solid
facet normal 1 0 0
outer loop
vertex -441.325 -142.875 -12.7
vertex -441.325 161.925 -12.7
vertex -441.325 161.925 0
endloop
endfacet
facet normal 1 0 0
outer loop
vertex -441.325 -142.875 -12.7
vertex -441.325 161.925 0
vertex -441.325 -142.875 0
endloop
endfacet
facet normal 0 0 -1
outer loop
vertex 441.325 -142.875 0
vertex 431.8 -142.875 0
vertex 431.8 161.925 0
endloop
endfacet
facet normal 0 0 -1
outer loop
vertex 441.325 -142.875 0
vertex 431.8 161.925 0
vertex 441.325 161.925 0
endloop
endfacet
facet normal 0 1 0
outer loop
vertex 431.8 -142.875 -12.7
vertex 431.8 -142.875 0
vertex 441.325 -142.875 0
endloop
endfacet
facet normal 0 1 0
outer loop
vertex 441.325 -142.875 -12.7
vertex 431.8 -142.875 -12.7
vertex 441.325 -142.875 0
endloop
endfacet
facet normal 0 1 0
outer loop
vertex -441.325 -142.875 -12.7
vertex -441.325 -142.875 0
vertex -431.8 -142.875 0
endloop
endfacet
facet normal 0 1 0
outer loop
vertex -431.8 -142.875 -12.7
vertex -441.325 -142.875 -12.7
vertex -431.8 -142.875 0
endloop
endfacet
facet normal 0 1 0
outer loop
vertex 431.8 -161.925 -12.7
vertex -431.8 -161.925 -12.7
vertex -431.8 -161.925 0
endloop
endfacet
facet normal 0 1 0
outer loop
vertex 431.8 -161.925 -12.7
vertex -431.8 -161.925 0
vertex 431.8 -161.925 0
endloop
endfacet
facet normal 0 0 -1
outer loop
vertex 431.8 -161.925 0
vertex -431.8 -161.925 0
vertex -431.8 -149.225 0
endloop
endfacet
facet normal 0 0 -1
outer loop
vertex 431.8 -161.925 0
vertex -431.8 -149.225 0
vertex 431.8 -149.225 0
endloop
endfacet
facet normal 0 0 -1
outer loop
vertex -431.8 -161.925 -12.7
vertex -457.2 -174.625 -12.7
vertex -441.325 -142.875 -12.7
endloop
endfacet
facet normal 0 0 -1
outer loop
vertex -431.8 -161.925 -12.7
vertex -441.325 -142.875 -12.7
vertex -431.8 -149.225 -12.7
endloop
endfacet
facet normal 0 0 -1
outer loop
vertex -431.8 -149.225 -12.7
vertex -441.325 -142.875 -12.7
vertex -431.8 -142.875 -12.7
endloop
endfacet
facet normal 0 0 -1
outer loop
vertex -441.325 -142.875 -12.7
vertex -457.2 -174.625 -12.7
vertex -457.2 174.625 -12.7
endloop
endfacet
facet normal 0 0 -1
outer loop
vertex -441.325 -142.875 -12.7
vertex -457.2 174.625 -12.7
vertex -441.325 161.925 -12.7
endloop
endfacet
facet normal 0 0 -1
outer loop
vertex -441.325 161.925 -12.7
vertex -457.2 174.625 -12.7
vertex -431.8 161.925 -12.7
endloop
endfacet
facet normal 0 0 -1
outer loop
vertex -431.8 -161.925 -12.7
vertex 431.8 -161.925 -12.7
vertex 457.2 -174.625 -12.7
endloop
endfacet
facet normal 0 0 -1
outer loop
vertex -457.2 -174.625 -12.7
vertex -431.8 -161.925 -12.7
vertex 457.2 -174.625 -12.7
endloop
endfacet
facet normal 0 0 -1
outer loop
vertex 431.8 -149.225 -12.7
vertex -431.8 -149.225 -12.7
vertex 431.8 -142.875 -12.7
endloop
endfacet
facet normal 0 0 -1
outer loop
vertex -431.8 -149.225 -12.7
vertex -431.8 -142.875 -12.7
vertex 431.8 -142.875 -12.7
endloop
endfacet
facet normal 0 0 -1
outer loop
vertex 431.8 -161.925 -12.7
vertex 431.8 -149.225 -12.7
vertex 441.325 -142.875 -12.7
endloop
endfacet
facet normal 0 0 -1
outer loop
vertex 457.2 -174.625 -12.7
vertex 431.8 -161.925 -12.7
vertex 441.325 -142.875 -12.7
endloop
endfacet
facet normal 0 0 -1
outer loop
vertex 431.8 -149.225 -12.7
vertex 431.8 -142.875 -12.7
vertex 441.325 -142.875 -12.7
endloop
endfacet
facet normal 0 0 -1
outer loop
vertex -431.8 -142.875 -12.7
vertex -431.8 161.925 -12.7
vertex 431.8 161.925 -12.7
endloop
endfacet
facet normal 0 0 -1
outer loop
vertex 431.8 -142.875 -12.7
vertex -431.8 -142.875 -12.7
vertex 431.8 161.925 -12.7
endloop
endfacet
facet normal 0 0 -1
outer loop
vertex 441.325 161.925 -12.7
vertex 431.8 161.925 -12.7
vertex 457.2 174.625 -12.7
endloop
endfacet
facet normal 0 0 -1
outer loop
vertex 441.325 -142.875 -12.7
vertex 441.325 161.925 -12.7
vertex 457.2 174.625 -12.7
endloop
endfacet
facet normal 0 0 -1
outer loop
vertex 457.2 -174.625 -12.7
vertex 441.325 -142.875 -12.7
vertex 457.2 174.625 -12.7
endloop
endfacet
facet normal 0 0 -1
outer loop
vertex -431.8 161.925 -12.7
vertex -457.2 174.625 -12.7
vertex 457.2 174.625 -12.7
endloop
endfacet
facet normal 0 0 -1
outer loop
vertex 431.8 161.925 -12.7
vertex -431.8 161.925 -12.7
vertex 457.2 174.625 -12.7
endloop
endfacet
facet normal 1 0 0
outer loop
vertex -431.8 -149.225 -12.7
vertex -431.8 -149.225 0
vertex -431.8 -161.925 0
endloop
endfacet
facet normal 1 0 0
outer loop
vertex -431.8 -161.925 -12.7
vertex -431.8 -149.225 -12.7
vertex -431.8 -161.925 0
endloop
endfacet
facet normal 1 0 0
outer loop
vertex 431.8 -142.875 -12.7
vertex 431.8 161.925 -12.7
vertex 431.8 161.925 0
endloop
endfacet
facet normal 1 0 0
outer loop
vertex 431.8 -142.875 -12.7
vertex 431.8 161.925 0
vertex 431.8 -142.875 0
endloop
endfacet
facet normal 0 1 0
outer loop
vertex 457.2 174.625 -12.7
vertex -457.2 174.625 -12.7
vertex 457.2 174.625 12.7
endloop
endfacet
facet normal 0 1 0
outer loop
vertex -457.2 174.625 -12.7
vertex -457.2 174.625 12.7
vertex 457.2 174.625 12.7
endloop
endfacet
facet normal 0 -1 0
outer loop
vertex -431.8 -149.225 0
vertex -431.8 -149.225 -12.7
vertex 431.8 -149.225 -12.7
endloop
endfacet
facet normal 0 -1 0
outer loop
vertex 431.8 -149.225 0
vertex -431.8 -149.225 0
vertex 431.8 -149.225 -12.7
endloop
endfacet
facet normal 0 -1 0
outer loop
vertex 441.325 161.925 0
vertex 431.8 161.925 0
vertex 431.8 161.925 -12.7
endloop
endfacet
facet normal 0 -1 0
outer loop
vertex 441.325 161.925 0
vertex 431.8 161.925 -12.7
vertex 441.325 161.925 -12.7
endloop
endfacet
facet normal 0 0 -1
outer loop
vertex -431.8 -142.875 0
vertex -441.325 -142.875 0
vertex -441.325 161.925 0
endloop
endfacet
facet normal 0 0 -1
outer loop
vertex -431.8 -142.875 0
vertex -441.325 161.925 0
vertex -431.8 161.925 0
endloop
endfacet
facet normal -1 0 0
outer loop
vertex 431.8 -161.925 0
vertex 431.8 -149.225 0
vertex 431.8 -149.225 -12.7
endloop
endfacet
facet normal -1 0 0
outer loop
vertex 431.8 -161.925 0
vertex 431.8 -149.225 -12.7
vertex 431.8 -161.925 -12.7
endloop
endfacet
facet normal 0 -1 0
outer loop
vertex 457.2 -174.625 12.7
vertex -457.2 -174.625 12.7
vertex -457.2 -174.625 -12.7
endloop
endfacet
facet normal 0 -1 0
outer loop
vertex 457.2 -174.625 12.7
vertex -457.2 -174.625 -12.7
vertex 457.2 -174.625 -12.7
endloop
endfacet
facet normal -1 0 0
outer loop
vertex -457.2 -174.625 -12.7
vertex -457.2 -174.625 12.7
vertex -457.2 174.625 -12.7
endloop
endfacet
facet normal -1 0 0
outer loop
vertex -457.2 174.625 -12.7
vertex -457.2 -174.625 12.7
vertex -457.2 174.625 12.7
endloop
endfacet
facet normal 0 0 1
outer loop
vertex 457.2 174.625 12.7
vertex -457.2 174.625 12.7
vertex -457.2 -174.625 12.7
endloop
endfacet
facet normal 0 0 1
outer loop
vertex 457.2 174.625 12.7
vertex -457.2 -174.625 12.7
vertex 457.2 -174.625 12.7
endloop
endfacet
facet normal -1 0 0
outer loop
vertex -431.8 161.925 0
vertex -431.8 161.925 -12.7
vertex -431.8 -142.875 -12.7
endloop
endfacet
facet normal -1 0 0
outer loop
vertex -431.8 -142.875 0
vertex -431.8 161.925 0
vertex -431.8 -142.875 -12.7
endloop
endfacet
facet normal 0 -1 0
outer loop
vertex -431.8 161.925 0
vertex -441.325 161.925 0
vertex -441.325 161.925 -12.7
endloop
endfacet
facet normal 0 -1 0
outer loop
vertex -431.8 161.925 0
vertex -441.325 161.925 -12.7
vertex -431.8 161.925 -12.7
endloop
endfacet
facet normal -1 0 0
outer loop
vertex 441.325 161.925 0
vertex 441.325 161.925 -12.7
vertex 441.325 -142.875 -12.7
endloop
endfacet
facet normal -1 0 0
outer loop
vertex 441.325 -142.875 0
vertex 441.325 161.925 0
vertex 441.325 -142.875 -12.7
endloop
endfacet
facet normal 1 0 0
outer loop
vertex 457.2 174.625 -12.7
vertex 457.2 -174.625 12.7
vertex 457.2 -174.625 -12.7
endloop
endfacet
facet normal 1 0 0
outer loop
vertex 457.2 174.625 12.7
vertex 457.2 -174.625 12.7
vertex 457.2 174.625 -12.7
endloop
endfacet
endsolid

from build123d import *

# Parameters (mm, degrees)
F0_W     = 914.4
F0_H     = 349.25
F1_DEPTH = 12.7
F2_W     = 863.6
F2_H     = 12.7
F3_DEPTH = 12.7
F4_W     = 9.525
F4_H     = 304.8
F5_DEPTH = 12.7


# Not quite as in the source:
# - a feature names something its author has since deleted; it is built from what else it names


with BuildPart() as f1:
    # F0 (on Top) → F1 (new body, symmetric)
    with BuildSketch(Plane.XY):
        Rectangle(F0_W, F0_H)
    extrude(amount=F1_DEPTH, both=True)

    # F2 (on face) → F3 (cut)
    with BuildSketch(Plane(origin=(0, 0, -12.7), x_dir=(1, 0, 0), z_dir=(0, 0, -1))):
        with Locations((0, 155.575)):
            Rectangle(F2_W, F2_H)
    extrude(amount=-F3_DEPTH, mode=Mode.SUBTRACT)

    # F4 (on face) → F5 (cut)
    with BuildSketch(Plane(origin=(0, 0, -12.7), x_dir=(1, 0, 0), z_dir=(0, 0, -1))):
        with Locations((-436.5625, -9.525)):
            Rectangle(F4_W, F4_H)
        with Locations((436.5625, -9.525)):
            Rectangle(F4_W, F4_H)
    extrude(amount=-F5_DEPTH, mode=Mode.SUBTRACT)


solid = f1.part
